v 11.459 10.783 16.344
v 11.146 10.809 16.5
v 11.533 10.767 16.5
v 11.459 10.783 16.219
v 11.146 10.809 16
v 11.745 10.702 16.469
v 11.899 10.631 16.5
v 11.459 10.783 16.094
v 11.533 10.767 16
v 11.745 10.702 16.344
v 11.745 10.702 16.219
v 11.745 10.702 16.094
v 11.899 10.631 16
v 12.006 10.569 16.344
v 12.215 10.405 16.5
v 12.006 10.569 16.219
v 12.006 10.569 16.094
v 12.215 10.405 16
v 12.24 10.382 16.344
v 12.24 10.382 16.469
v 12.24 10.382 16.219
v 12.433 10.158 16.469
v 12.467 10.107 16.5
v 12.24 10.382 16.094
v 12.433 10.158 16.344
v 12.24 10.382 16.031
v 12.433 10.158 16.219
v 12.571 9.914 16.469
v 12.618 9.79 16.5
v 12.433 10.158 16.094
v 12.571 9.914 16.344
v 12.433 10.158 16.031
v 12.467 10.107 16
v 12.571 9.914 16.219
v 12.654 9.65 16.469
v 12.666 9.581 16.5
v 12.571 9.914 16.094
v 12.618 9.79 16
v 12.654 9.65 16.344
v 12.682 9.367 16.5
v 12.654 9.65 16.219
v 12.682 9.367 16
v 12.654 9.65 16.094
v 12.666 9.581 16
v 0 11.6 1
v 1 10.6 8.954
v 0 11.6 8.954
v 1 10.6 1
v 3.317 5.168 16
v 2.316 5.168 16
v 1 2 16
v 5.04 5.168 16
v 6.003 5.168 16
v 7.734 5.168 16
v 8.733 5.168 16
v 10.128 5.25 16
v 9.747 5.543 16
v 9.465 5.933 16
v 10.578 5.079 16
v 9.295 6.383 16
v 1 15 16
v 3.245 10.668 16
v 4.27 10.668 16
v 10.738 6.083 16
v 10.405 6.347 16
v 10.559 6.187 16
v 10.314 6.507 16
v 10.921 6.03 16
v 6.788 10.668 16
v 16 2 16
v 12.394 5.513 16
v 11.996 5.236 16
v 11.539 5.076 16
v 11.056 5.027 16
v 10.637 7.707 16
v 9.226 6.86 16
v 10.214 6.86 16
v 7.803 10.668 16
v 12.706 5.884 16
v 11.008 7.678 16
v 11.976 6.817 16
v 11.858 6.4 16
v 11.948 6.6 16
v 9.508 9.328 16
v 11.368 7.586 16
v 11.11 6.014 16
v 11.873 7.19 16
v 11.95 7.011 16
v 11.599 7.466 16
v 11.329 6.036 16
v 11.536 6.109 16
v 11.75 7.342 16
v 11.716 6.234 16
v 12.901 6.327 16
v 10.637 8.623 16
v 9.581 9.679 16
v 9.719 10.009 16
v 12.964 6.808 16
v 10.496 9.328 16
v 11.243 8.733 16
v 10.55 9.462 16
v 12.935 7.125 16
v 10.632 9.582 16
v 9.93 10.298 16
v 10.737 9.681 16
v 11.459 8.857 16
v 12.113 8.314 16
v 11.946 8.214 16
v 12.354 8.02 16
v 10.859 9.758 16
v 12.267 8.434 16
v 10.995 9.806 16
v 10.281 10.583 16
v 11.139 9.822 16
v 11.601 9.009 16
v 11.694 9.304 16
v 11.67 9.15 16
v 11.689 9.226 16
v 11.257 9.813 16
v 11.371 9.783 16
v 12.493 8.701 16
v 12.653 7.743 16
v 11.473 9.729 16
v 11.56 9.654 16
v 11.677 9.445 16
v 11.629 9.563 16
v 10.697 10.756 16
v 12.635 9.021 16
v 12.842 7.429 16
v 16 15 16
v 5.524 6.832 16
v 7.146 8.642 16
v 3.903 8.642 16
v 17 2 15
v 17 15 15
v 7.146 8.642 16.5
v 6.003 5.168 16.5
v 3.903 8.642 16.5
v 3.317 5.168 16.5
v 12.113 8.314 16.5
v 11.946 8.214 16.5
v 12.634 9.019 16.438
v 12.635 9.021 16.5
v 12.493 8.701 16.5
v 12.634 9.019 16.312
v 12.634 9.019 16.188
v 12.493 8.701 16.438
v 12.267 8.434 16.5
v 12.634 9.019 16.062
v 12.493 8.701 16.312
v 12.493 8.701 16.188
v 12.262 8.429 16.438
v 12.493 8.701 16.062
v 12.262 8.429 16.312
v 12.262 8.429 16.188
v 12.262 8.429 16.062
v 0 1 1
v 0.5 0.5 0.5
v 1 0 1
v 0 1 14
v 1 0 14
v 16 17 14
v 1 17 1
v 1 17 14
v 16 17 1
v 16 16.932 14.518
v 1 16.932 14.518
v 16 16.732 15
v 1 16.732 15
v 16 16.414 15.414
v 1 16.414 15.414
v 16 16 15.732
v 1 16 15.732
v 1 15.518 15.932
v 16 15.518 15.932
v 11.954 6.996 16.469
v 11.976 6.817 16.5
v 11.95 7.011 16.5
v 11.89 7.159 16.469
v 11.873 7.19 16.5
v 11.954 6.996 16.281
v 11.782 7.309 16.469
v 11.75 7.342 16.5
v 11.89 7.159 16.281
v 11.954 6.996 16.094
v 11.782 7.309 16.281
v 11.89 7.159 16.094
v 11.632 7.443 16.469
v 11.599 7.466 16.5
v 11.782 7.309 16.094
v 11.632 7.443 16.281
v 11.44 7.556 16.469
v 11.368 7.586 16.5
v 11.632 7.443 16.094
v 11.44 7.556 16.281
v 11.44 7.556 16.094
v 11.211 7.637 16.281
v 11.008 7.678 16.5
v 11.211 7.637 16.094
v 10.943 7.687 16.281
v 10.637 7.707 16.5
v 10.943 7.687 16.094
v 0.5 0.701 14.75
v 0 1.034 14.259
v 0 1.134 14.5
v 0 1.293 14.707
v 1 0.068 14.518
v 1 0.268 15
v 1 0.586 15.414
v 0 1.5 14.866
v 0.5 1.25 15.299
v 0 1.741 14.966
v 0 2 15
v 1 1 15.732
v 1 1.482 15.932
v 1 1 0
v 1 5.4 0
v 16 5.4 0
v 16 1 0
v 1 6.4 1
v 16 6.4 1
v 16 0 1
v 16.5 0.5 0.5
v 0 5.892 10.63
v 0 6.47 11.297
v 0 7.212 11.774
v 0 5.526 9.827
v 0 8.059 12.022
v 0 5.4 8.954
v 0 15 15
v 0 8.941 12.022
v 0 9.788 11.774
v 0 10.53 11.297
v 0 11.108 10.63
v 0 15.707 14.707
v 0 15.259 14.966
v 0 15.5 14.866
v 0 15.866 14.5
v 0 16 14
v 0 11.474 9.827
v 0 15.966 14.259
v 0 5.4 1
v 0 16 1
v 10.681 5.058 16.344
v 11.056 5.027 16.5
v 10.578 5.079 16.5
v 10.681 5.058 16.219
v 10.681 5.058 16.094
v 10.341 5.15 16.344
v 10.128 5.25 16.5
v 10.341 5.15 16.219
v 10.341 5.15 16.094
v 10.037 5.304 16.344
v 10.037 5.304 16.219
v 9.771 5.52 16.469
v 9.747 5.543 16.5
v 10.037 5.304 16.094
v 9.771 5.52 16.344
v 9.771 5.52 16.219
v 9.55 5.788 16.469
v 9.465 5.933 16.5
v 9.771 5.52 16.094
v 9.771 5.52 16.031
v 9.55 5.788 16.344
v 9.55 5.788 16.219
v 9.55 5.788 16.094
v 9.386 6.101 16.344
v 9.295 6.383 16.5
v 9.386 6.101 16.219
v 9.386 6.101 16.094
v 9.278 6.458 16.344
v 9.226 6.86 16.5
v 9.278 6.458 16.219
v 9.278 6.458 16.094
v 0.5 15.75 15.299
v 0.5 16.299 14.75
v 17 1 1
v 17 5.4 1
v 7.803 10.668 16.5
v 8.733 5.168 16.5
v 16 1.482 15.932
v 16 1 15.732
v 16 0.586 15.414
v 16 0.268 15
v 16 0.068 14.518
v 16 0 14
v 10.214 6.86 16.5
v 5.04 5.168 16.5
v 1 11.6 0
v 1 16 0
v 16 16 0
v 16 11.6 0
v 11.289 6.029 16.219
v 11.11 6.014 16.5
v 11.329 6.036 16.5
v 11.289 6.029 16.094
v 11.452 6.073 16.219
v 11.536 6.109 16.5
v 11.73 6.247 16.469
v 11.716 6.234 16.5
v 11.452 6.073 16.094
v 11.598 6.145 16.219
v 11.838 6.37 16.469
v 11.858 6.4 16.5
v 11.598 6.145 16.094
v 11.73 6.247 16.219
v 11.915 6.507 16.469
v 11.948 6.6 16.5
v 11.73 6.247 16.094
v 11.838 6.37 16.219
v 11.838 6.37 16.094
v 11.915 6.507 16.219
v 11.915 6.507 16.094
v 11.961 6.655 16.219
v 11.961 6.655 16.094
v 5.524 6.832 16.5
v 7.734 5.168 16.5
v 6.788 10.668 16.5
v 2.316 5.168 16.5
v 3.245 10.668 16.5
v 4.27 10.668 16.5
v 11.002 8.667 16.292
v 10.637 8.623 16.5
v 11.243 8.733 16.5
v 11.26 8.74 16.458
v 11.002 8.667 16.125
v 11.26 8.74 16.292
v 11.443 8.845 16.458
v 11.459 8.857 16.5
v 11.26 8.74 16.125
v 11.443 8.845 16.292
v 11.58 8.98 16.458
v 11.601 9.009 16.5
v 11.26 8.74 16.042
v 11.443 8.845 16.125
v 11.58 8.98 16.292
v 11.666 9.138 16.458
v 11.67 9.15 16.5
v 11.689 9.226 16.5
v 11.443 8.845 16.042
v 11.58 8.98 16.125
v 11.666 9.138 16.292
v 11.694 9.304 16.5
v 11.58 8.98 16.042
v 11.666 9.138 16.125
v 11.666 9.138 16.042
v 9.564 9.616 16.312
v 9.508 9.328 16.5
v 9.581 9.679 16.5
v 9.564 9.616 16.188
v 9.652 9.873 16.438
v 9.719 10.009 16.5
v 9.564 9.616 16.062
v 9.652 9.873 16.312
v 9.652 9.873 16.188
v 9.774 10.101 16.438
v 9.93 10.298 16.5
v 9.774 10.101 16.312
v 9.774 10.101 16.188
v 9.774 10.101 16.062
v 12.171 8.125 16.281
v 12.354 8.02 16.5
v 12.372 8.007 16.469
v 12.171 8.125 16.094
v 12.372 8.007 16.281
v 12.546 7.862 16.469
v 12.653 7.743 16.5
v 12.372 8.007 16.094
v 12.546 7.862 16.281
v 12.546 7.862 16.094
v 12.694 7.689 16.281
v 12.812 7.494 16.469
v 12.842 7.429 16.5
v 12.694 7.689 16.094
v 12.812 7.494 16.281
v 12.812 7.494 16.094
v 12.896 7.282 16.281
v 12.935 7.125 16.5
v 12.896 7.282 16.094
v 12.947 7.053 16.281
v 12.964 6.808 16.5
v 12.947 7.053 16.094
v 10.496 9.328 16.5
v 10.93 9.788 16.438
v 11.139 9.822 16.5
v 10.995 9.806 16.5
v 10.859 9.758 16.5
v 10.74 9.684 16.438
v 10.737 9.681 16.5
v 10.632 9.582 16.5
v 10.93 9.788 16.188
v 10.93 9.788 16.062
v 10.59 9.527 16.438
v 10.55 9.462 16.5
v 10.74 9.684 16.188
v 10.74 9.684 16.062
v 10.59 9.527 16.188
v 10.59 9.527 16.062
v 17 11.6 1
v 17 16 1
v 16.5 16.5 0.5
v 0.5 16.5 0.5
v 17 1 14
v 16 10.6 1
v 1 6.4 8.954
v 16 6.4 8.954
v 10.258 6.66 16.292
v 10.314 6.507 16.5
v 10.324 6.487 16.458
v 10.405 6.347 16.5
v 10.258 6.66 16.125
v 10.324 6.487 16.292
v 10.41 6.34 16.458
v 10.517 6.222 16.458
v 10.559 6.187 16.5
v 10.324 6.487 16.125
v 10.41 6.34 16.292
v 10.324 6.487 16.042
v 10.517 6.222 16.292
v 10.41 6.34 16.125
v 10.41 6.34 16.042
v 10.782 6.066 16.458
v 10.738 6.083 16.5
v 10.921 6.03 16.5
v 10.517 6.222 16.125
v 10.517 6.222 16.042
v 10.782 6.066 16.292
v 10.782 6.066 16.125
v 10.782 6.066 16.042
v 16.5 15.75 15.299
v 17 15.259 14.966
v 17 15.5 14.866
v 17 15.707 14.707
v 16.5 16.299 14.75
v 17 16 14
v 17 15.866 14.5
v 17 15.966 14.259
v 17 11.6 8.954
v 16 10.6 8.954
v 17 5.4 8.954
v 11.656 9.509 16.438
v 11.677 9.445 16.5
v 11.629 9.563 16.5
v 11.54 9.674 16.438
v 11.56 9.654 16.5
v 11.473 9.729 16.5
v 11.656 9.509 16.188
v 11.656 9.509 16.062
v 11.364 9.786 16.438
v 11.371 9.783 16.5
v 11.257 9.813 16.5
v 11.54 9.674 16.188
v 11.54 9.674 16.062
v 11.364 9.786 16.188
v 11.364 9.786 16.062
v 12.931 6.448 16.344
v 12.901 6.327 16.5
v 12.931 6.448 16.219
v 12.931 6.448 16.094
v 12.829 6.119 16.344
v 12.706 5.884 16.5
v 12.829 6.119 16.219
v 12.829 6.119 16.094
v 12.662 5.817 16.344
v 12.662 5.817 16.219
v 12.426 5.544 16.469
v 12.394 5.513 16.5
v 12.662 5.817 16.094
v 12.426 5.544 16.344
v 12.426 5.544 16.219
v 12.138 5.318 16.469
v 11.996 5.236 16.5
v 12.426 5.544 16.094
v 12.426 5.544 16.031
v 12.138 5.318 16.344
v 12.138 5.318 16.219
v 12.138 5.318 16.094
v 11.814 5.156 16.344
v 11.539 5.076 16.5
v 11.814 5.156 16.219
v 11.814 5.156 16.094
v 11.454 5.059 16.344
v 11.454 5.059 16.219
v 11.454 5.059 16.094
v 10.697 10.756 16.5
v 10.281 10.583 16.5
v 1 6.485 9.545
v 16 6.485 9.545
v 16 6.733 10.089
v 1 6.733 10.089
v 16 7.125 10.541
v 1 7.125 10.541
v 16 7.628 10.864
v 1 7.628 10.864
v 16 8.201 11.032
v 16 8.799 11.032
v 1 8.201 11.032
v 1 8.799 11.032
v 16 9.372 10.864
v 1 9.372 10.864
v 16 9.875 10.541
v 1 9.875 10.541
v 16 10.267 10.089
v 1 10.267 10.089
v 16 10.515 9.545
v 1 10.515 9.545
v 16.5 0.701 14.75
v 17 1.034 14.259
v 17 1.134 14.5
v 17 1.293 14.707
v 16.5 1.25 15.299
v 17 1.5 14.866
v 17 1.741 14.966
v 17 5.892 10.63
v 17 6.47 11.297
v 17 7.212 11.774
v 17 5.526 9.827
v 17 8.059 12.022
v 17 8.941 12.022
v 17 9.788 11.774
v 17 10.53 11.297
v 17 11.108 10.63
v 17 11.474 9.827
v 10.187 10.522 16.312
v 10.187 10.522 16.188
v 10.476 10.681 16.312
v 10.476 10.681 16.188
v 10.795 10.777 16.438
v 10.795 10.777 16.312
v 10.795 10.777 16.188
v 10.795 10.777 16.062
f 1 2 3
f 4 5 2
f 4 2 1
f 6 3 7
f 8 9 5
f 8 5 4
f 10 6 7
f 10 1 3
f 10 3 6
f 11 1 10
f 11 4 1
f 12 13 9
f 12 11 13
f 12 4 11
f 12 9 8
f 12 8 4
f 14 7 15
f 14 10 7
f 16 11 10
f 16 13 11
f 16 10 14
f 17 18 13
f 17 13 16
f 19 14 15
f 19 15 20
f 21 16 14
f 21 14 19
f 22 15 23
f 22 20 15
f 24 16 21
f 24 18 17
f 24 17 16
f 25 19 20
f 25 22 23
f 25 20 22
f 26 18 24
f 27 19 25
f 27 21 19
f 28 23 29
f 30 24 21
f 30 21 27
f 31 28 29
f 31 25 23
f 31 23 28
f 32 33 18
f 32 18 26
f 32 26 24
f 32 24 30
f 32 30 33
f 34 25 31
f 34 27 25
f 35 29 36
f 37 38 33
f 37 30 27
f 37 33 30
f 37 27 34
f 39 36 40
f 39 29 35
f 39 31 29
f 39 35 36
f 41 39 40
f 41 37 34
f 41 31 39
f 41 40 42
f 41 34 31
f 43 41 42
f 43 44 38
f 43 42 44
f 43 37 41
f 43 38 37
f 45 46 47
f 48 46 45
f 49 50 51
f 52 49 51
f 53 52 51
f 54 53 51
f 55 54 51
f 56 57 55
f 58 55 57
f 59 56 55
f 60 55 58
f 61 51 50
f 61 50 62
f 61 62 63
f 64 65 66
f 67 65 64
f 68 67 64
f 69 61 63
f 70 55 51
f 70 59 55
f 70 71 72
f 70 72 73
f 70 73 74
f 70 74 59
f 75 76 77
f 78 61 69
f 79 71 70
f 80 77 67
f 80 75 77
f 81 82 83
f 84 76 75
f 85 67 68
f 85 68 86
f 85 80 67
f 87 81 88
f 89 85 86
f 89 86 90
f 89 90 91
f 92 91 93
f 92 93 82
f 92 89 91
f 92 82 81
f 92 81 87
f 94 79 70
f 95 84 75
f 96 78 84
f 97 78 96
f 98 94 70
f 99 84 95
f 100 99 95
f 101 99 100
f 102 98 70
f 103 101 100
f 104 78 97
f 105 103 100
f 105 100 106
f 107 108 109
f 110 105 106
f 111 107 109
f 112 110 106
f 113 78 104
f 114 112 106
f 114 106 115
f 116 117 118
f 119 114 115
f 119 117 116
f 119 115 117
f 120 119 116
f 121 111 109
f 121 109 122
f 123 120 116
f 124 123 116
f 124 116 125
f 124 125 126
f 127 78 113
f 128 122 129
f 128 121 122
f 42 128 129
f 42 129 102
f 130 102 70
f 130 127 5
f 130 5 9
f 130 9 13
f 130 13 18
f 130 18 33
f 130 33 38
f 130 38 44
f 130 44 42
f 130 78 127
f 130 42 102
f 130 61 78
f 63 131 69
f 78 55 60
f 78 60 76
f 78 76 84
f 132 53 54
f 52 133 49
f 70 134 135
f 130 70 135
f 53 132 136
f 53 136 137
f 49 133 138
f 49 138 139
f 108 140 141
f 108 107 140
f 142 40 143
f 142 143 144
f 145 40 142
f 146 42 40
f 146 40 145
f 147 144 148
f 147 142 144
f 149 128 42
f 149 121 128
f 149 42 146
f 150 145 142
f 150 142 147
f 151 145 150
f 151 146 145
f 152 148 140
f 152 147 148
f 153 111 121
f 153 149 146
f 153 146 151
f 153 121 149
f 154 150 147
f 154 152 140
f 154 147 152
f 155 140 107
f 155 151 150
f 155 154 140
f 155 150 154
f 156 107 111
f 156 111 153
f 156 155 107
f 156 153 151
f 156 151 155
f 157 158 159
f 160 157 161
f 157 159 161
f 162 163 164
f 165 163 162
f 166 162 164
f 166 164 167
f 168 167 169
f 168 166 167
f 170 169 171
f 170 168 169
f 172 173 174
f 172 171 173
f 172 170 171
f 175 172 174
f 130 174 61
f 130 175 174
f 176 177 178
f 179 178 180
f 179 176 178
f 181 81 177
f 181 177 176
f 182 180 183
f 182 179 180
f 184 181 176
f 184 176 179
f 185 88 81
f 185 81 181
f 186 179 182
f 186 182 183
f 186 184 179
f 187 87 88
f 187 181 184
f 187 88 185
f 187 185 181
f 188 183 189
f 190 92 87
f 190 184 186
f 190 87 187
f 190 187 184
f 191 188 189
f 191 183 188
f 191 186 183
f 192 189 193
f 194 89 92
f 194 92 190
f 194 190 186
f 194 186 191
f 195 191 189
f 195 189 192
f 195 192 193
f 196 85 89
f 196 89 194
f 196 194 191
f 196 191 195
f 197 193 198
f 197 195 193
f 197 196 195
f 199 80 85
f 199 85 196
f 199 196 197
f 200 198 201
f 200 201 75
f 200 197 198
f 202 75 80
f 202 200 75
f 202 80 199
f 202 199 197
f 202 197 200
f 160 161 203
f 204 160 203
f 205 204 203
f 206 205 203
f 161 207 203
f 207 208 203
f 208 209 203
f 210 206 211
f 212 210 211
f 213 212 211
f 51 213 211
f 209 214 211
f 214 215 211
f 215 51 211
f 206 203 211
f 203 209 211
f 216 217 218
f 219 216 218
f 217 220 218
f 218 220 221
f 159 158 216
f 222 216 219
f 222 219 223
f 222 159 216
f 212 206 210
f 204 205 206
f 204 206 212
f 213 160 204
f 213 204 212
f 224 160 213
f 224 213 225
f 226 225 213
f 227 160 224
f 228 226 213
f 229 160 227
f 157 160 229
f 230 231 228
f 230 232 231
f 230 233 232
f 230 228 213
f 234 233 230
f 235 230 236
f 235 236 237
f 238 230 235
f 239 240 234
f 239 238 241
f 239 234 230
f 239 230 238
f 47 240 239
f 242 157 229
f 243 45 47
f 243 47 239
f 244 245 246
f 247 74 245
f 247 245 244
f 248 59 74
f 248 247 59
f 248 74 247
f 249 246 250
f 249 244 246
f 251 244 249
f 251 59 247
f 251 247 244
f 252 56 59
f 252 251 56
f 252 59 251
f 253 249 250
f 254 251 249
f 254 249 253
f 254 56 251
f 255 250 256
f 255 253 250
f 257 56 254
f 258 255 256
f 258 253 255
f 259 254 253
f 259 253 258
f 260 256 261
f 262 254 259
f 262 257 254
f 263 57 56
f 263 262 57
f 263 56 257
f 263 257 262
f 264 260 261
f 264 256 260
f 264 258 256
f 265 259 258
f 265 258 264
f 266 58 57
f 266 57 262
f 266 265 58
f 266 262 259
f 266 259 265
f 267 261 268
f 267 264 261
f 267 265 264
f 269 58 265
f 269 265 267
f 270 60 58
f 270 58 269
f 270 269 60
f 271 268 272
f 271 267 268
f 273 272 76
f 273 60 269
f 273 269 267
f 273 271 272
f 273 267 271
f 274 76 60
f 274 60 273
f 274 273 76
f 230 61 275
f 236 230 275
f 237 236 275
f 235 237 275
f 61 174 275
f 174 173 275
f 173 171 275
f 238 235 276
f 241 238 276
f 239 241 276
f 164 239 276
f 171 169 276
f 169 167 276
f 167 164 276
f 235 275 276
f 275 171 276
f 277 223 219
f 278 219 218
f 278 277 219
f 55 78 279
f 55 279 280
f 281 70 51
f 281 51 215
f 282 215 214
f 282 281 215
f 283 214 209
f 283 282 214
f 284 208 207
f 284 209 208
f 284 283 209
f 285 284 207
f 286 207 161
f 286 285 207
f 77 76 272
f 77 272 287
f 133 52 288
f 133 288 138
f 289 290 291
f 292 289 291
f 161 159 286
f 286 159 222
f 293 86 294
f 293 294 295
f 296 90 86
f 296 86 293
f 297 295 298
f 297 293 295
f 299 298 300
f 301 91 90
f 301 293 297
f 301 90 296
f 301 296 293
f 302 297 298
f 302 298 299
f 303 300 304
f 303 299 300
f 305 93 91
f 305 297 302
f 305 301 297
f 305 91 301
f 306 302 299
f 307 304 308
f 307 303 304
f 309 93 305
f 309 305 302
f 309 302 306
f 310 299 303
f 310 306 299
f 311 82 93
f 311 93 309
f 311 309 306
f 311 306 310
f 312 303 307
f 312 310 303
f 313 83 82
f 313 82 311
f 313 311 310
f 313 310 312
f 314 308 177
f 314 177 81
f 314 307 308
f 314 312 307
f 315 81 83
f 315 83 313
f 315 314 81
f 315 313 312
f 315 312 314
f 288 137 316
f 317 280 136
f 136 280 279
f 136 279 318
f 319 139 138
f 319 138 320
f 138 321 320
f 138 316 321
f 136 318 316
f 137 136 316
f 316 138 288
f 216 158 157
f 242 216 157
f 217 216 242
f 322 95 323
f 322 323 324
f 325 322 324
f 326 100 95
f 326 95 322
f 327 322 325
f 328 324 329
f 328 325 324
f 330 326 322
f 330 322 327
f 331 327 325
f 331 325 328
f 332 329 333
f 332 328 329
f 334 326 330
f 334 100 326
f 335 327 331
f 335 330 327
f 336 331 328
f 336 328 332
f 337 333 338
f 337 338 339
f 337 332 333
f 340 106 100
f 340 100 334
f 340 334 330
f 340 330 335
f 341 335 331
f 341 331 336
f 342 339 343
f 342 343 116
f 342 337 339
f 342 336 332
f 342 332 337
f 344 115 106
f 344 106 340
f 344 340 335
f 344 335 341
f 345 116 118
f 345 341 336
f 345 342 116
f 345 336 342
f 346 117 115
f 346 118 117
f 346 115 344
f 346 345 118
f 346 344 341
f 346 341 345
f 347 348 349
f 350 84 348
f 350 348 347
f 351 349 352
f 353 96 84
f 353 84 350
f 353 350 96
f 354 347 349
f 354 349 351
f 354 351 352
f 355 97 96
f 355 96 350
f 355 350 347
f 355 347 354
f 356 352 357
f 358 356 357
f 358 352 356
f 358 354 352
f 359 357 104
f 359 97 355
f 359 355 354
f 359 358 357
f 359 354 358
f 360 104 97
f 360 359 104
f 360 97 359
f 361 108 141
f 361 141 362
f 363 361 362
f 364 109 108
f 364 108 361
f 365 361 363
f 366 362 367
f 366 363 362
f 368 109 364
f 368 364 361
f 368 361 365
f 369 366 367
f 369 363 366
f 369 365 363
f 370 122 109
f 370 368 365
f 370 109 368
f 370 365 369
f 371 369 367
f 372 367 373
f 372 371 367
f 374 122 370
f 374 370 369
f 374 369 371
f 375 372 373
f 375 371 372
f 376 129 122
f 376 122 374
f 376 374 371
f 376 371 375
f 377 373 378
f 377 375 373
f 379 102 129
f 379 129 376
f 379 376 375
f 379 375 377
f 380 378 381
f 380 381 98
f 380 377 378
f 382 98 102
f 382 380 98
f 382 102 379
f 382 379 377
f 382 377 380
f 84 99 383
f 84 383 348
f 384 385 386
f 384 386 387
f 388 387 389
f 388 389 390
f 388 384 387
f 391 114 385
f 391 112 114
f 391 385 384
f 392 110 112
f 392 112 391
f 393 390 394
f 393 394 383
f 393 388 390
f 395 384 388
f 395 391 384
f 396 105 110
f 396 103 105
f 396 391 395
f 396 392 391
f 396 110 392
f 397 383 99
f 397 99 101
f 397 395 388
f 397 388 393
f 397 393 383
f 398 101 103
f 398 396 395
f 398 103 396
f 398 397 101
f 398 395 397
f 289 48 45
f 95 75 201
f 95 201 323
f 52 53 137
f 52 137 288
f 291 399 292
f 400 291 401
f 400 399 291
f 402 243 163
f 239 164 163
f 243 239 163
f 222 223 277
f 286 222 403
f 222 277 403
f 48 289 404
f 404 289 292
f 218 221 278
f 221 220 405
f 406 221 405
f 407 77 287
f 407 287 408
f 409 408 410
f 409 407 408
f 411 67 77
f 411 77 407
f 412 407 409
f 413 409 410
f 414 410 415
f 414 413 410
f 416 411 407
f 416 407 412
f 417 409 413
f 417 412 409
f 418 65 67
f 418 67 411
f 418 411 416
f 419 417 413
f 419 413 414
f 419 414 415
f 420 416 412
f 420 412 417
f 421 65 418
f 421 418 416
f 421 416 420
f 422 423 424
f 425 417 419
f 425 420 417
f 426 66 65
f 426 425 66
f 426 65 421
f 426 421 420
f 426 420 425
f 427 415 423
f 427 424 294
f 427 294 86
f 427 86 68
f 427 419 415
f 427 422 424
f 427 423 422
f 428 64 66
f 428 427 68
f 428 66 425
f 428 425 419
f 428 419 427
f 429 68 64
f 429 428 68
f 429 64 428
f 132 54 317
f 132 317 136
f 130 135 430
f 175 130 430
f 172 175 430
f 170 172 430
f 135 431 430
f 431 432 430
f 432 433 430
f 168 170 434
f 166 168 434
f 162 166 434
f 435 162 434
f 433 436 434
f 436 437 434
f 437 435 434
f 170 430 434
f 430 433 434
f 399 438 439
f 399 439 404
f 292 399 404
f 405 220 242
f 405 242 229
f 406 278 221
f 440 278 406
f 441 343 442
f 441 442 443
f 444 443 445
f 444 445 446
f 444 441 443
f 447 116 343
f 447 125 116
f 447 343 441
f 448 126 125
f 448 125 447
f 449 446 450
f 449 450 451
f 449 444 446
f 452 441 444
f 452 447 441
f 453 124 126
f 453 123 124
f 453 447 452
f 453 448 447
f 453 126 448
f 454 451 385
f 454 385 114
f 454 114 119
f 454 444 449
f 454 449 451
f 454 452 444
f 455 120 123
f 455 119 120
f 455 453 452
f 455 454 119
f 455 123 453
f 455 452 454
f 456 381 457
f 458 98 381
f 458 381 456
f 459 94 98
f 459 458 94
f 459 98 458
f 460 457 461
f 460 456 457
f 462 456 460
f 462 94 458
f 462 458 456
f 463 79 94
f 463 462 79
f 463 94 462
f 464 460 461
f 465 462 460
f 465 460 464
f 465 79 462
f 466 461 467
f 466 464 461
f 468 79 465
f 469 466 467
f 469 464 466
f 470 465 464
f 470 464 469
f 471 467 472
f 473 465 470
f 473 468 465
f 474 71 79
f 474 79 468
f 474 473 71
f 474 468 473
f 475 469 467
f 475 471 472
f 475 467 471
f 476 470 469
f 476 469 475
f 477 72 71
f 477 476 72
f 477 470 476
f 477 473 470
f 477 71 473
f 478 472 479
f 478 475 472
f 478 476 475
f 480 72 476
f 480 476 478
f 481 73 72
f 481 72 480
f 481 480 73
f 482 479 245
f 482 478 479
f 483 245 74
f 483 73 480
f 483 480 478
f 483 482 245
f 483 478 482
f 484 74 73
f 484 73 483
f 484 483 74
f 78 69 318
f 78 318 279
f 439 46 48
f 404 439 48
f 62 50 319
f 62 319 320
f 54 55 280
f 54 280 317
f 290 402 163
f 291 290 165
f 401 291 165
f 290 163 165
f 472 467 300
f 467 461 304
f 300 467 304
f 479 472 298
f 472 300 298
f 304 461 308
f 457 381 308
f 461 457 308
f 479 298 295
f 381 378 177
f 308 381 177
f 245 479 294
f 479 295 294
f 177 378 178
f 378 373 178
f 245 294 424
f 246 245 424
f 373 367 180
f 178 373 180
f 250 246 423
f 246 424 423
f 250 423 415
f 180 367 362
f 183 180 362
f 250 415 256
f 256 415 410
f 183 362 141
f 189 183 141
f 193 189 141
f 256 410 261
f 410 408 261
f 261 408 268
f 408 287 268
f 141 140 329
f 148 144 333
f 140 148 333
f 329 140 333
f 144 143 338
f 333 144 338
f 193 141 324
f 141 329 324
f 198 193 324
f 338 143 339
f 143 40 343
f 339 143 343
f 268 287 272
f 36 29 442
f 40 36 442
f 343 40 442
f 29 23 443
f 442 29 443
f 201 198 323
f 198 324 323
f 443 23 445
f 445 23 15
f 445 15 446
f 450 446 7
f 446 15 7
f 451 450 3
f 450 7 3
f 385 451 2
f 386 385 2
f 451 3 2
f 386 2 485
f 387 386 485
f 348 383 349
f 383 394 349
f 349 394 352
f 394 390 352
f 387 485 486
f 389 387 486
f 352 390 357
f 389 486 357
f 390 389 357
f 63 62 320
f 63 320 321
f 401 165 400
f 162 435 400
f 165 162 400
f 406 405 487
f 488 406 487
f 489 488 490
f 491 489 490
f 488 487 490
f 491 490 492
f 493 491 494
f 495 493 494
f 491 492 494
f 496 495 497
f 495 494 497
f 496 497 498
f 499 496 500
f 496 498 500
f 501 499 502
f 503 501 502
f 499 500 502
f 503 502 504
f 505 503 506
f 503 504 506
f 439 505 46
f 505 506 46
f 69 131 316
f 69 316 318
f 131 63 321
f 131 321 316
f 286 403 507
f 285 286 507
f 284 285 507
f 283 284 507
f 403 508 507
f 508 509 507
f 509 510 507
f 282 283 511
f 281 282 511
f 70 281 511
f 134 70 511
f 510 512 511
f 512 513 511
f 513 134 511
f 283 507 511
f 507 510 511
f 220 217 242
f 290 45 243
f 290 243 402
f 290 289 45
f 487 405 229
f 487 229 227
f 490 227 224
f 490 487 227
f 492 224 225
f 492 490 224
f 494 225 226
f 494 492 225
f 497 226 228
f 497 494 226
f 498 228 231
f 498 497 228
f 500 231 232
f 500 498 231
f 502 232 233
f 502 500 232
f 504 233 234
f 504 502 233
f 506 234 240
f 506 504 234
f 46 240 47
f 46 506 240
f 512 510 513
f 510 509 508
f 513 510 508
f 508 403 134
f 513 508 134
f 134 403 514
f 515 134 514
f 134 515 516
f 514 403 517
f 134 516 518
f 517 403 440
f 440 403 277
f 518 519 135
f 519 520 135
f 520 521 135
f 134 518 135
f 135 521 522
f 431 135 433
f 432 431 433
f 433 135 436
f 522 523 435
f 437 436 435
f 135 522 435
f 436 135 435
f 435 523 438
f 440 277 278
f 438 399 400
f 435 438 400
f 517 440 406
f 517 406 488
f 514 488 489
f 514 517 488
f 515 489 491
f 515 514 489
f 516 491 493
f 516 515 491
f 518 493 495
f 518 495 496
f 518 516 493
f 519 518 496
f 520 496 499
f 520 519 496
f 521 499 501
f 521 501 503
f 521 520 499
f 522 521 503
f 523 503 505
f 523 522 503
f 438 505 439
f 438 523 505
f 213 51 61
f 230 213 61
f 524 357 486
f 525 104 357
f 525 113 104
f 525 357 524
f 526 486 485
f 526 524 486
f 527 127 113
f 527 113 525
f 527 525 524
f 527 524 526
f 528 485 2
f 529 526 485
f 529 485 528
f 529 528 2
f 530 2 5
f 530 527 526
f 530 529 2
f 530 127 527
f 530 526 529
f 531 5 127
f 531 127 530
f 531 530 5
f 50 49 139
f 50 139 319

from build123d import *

# Parameters (mm, degrees)
SKETCH1_W           = 17
SKETCH1_H           = 17
BOSS_EXTRUDE1_DEPTH = 16
CUT_EXTRUDE1_DEPTH  = 29.879058156
CHAMFER1_SIZE       = 1
FILLET1_R           = 2
BOSS_EXTRUDE2_DEPTH = 0.5
CHAMFER3_SIZE       = 1


with BuildPart() as part:
    # Sketch1 → Boss-Extrude1 (new body)
    with BuildSketch(Plane.XY):
        with Locations((8.5, 8.5)):
            Rectangle(SKETCH1_W, SKETCH1_H)
    extrude(amount=BOSS_EXTRUDE1_DEPTH)

    # Sketch2 → Cut-Extrude1 (cut, through all)
    with BuildSketch(Plane.ZY):
        with BuildLine():
            Line((8.953848021, 10.6), (0, 10.6))
            Line((0, 10.6), (0, 6.4))
            Line((0, 6.4), (8.953848021, 6.4))
            ThreePointArc((8.953848021, 6.4), (11.053848021, 8.5), (8.953848021, 10.6))
        make_face()
    extrude(amount=-CUT_EXTRUDE1_DEPTH, mode=Mode.SUBTRACT)

    # Chamfer1
    chamfer1_edges = [part.edges().sort_by_distance(p)[0] for p in [
        (0, 3.2, 0),
        (17, 13.8, 0),
        (17, 8.5, 11.053848021),
        (17, 6.4, 4.47692401),
        (8.5, 6.4, 0),
        (17, 10.6, 4.47692401),
        (8.5, 10.6, 0),
        (0, 8.5, 11.053848021),
        (0, 10.6, 4.47692401),
        (0, 6.4, 4.47692401),
        (8.5, 17, 0),
        (17, 3.2, 0),
        (8.5, 0, 0),
        (0, 13.8, 0),
    ]]
    chamfer(chamfer1_edges, length=CHAMFER1_SIZE)

    # Fillet1
    fillet1_edges = [part.edges().sort_by_distance(p)[0] for p in [
        (8.5, 17, 16),
        (8.5, 0, 16),
    ]]
    fillet(fillet1_edges, radius=FILLET1_R)

    # Sketch3 → Boss-Extrude2 (add)
    with BuildSketch(Plane.XY.offset(16)):
        Polygon((3.244919175, 10.668082206), (4.269558598, 10.668082206), (5.524466451, 6.831744065), (6.788188406, 10.668082206), (7.802911963, 10.668082206), (8.732799784, 5.168082206), (7.733500906, 5.168082206), (7.146261322, 8.641940379), (6.002631515, 5.168082206), (5.039690809, 5.168082206), (3.902671579, 8.641940379), (3.316533758, 5.168082206), (2.316133117, 5.168082206), align=None)
        with BuildLine():
            Line((10.495620297, 9.328338616), (9.508440809, 9.328338616))
            add(Edge.make_bspline(
                [(9.508440809, 9.328338616), (9.515410672, 9.377684197), (9.529074626, 9.47442294), (9.56177064, 9.61447654), (9.600878602, 9.747326965), (9.649702894, 9.872553504), (9.706965845, 9.990379227), (9.772085156, 10.101208455), (9.84576479, 10.204565488), (9.90224101, 10.266828175), (9.93041597, 10.297889898)],
                knots=[0, 0, 0, 0, 1.111473889, 2.178970933, 3.205615836, 4.199322666, 5.174200091, 6.12565194, 7.064921805, 8, 8, 8, 8], degree=3))
            add(Edge.make_bspline(
                [(9.93041597, 10.297889898), (9.971054616, 10.338873592), (10.051149118, 10.419648144), (10.184996423, 10.523111423), (10.325293118, 10.612651854), (10.474852914, 10.683640156), (10.631348547, 10.741096963), (10.796024526, 10.779690829), (10.968207924, 10.805298201), (11.085701432, 10.807820616), (11.145660361, 10.809107847)],
                knots=[0, 0, 0, 0, 1.01925491, 2.00884431, 2.983262333, 3.955970413, 4.92937149, 5.924503185, 6.940838805, 8, 8, 8, 8], degree=3))
            add(Edge.make_bspline(
                [(11.145660361, 10.809107847), (11.198966933, 10.807849383), (11.303756913, 10.805375497), (11.457771816, 10.785516482), (11.604612137, 10.750685982), (11.745830021, 10.705145883), (11.879348613, 10.643180969), (12.008114798, 10.571252892), (12.128530844, 10.483030116), (12.240878502, 10.383347258), (12.344091254, 10.275530489), (12.433473949, 10.160283229), (12.510317856, 10.040683999), (12.573627071, 9.915739156), (12.622303254, 9.785237276), (12.656085968, 9.649932253), (12.678197575, 9.510122647), (12.680400469, 9.415095941), (12.681517733, 9.366900315)],
                knots=[0, 0, 0, 0, 1.091422571, 2.145516843, 3.172569842, 4.178562979, 5.178154469, 6.181868002, 7.194278174, 8.227918432, 9.254613415, 10.245994977, 11.209837596, 12.161663635, 13.10878368, 14.055455738, 15.013766427, 16, 16, 16, 16], degree=3))
            add(Edge.make_bspline(
                [(12.681517733, 9.366900315), (12.679225042, 9.307214046), (12.674711438, 9.189710131), (12.637674052, 9.017734423), (12.579700472, 8.853294955), (12.495951997, 8.698692484), (12.391245073, 8.55434775), (12.262773184, 8.425086631), (12.114195543, 8.308882488), (12.002656329, 8.246434368), (11.945540168, 8.214456405)],
                knots=[0, 0, 0, 0, 0.992805628, 1.954529043, 2.915727527, 3.886831945, 4.871318353, 5.87440735, 6.911542536, 8, 8, 8, 8], degree=3))
            add(Edge.make_bspline(
                [(11.945540168, 8.214456405), (11.984743825, 8.201585019), (12.061777251, 8.176293323), (12.171271003, 8.126481615), (12.275387051, 8.072045674), (12.372332552, 8.00880546), (12.463071747, 7.939318128), (12.547051478, 7.862989674), (12.624773506, 7.77998653), (12.69496905, 7.689852211), (12.757270338, 7.594028239), (12.813169966, 7.494728091), (12.859178476, 7.390445863), (12.898153411, 7.282372527), (12.927826708, 7.169536779), (12.948719361, 7.052375846), (12.960795827, 6.931156981), (12.962637694, 6.849031274), (12.963569015, 6.807505283)],
                knots=[0, 0, 0, 0, 1.059543567, 2.081955587, 3.086750234, 4.076226789, 5.052108497, 6.020845489, 6.989030705, 7.970690546, 8.952259656, 9.923888338, 10.895517021, 11.877585046, 12.873342345, 13.889638361, 14.932918083, 16, 16, 16, 16], degree=3))
            add(Edge.make_bspline(
                [(12.963569015, 6.807505283), (12.961681103, 6.746478937), (12.957958525, 6.626147412), (12.93429212, 6.448911389), (12.890229538, 6.279932588), (12.83226277, 6.117266652), (12.754941393, 5.96301354), (12.663947131, 5.813633354), (12.5520969, 5.674306556), (12.427794574, 5.541349707), (12.289749595, 5.420471294), (12.140086379, 5.315675149), (11.982095893, 5.225741411), (11.814778577, 5.15273064), (11.638192558, 5.096503997), (11.452731433, 5.055860787), (11.257615945, 5.030994598), (11.124434358, 5.02838785), (11.056417572, 5.027056565)],
                knots=[0, 0, 0, 0, 1.005138573, 1.981928558, 2.936866704, 3.876260664, 4.820238198, 5.773547, 6.751179199, 7.756627054, 8.768222608, 9.766606018, 10.760583154, 11.757261445, 12.767156078, 13.807575856, 14.880313354, 16, 16, 16, 16], degree=3))
            add(Edge.make_bspline(
                [(11.056417572, 5.027056565), (10.99207479, 5.02846018), (10.866260993, 5.031204763), (10.682231983, 5.054960522), (10.507329828, 5.093280489), (10.341108177, 5.147295661), (10.184210125, 5.217344107), (10.035212862, 5.300756089), (9.897089595, 5.402342616), (9.768301357, 5.517517881), (9.651705062, 5.646737988), (9.547495432, 5.787009618), (9.457970308, 5.938866167), (9.382762546, 6.10165884), (9.3224601, 6.275673225), (9.274893708, 6.460555454), (9.241667805, 6.656666729), (9.231548786, 6.791595459), (9.226389527, 6.860389898)],
                knots=[0, 0, 0, 0, 1.066544725, 2.085487077, 3.070979577, 4.031932826, 4.977951092, 5.916076795, 6.857635327, 7.814973522, 8.776389752, 9.738577119, 10.707772778, 11.69409279, 12.707140348, 13.757286496, 14.856535458, 16, 16, 16, 16], degree=3))
            Line((9.226389527, 6.860389898), (10.213569015, 6.860389898))
            add(Edge.make_bspline(
                [(10.213569015, 6.860389898), (10.219824668, 6.825799151), (10.232009194, 6.7584246), (10.255774364, 6.660881227), (10.286743696, 6.570842669), (10.322551949, 6.487508666), (10.361230253, 6.409785071), (10.407962894, 6.340542409), (10.459325549, 6.277900458), (10.533442235, 6.203431016), (10.639397142, 6.126916773), (10.782471369, 6.060422256), (10.941627897, 6.0214483), (11.052894184, 6.016693597), (11.110403951, 6.014236052)],
                knots=[0, 0, 0, 0, 0.928156231, 1.807827665, 2.648129825, 3.438902246, 4.202261636, 4.936546065, 5.639352463, 6.338805438, 7.70633318, 9.064371875, 10.482673459, 12, 12, 12, 12], degree=3))
            add(Edge.make_bspline(
                [(11.110403951, 6.014236052), (11.140920666, 6.014759363), (11.200696083, 6.015784412), (11.288497271, 6.027145709), (11.372140265, 6.045857774), (11.451780855, 6.071286777), (11.527926037, 6.103163621), (11.599120982, 6.144266905), (11.66681682, 6.192055339), (11.730277635, 6.245782226), (11.788916737, 6.304325301), (11.837707918, 6.369151809), (11.882299527, 6.435027129), (11.915279803, 6.506261054), (11.944177629, 6.57902044), (11.961864575, 6.655946223), (11.975219489, 6.735424708), (11.975995623, 6.789816294), (11.976389527, 6.817421148)],
                knots=[0, 0, 0, 0, 1.110435564, 2.175094844, 3.216326037, 4.226890168, 5.215276772, 6.21526065, 7.213097102, 8.228249917, 9.239874822, 10.221364777, 11.178138315, 12.128914389, 13.072518965, 14.022636769, 14.996447288, 16, 16, 16, 16], degree=3))
            add(Edge.make_bspline(
                [(11.976389527, 6.817421148), (11.975343786, 6.84761176), (11.973261954, 6.907714349), (11.95625317, 6.99542144), (11.929392706, 7.079788593), (11.892080239, 7.16044219), (11.842253599, 7.237084958), (11.783458719, 7.311254584), (11.711063536, 7.37909067), (11.631636324, 7.446144585), (11.539531961, 7.504595376), (11.43923606, 7.558536867), (11.328112687, 7.601457641), (11.208874464, 7.639793843), (11.079265887, 7.667794008), (10.94009178, 7.688124858), (10.791576649, 7.703258025), (10.689203239, 7.705429126), (10.636645938, 7.706543745)],
                knots=[0, 0, 0, 0, 0.809814727, 1.612155564, 2.388397, 3.182215007, 3.988903953, 4.837162975, 5.715530372, 6.646997145, 7.623086902, 8.637258368, 9.698941581, 10.815059213, 11.996518529, 13.252603015, 14.589518788, 16, 16, 16, 16], degree=3))
            Line((10.636645938, 7.706543745), (10.636645938, 8.623210411))
            add(Edge.make_bspline(
                [(10.636645938, 8.623210411), (10.702082904, 8.628783233), (10.824502508, 8.639208878), (10.994427483, 8.663589612), (11.137482407, 8.696178476), (11.257105609, 8.735495178), (11.356433051, 8.785988065), (11.443204956, 8.841729984), (11.517937025, 8.906466075), (11.581095648, 8.978265919), (11.631620581, 9.055372218), (11.667379186, 9.136586513), (11.6909923, 9.219395932), (11.693229641, 9.276035079), (11.694338245, 9.304099834)],
                knots=[0, 0, 0, 0, 1.70044513, 3.18119609, 4.440695891, 5.496282586, 6.431922213, 7.318171381, 8.16090191, 8.983045123, 9.787564368, 10.536848927, 11.275007137, 12, 12, 12, 12], degree=3))
            add(Edge.make_bspline(
                [(11.694338245, 9.304099834), (11.692425585, 9.339907415), (11.688692477, 9.409796232), (11.659699137, 9.509821852), (11.609369984, 9.598986402), (11.541887427, 9.677102254), (11.459657586, 9.742350468), (11.363269796, 9.789719559), (11.254815679, 9.817551015), (11.178512364, 9.820436199), (11.139049784, 9.82192836)],
                knots=[0, 0, 0, 0, 1.009664648, 1.970651636, 2.907870547, 3.878035693, 4.867062054, 5.849714035, 6.887914197, 8, 8, 8, 8], degree=3))
            add(Edge.make_bspline(
                [(11.139049784, 9.82192836), (11.103281391, 9.820167767), (11.032305946, 9.816674212), (10.9285186, 9.79059924), (10.8299552, 9.746705269), (10.738656716, 9.686178071), (10.655941059, 9.613487472), (10.588055369, 9.527400545), (10.531591271, 9.433074908), (10.507657627, 9.363387579), (10.495620297, 9.328338616)],
                knots=[0, 0, 0, 0, 0.98818071, 1.960853194, 2.938124878, 3.957524365, 4.978590984, 5.968022688, 6.978025184, 8, 8, 8, 8], degree=3))
        make_face()
    extrude(amount=BOSS_EXTRUDE2_DEPTH)

    # Chamfer3
    chamfer3_edges = [part.edges().sort_by_distance(p)[0] for p in [
        (0, 8.5, 16),
        (17, 8.5, 16),
        (17, 0, 7.5),
        (17, 17, 7.5),
        (17, 16.414213562, 15.414213562),
        (17, 0.585786438, 15.414213562),
        (0, 0, 7.5),
        (0, 17, 7.5),
        (0, 16.414213562, 15.414213562),
        (0, 0.585786438, 15.414213562),
    ]]
    chamfer(chamfer3_edges, length=CHAMFER3_SIZE)


solid = part.part
